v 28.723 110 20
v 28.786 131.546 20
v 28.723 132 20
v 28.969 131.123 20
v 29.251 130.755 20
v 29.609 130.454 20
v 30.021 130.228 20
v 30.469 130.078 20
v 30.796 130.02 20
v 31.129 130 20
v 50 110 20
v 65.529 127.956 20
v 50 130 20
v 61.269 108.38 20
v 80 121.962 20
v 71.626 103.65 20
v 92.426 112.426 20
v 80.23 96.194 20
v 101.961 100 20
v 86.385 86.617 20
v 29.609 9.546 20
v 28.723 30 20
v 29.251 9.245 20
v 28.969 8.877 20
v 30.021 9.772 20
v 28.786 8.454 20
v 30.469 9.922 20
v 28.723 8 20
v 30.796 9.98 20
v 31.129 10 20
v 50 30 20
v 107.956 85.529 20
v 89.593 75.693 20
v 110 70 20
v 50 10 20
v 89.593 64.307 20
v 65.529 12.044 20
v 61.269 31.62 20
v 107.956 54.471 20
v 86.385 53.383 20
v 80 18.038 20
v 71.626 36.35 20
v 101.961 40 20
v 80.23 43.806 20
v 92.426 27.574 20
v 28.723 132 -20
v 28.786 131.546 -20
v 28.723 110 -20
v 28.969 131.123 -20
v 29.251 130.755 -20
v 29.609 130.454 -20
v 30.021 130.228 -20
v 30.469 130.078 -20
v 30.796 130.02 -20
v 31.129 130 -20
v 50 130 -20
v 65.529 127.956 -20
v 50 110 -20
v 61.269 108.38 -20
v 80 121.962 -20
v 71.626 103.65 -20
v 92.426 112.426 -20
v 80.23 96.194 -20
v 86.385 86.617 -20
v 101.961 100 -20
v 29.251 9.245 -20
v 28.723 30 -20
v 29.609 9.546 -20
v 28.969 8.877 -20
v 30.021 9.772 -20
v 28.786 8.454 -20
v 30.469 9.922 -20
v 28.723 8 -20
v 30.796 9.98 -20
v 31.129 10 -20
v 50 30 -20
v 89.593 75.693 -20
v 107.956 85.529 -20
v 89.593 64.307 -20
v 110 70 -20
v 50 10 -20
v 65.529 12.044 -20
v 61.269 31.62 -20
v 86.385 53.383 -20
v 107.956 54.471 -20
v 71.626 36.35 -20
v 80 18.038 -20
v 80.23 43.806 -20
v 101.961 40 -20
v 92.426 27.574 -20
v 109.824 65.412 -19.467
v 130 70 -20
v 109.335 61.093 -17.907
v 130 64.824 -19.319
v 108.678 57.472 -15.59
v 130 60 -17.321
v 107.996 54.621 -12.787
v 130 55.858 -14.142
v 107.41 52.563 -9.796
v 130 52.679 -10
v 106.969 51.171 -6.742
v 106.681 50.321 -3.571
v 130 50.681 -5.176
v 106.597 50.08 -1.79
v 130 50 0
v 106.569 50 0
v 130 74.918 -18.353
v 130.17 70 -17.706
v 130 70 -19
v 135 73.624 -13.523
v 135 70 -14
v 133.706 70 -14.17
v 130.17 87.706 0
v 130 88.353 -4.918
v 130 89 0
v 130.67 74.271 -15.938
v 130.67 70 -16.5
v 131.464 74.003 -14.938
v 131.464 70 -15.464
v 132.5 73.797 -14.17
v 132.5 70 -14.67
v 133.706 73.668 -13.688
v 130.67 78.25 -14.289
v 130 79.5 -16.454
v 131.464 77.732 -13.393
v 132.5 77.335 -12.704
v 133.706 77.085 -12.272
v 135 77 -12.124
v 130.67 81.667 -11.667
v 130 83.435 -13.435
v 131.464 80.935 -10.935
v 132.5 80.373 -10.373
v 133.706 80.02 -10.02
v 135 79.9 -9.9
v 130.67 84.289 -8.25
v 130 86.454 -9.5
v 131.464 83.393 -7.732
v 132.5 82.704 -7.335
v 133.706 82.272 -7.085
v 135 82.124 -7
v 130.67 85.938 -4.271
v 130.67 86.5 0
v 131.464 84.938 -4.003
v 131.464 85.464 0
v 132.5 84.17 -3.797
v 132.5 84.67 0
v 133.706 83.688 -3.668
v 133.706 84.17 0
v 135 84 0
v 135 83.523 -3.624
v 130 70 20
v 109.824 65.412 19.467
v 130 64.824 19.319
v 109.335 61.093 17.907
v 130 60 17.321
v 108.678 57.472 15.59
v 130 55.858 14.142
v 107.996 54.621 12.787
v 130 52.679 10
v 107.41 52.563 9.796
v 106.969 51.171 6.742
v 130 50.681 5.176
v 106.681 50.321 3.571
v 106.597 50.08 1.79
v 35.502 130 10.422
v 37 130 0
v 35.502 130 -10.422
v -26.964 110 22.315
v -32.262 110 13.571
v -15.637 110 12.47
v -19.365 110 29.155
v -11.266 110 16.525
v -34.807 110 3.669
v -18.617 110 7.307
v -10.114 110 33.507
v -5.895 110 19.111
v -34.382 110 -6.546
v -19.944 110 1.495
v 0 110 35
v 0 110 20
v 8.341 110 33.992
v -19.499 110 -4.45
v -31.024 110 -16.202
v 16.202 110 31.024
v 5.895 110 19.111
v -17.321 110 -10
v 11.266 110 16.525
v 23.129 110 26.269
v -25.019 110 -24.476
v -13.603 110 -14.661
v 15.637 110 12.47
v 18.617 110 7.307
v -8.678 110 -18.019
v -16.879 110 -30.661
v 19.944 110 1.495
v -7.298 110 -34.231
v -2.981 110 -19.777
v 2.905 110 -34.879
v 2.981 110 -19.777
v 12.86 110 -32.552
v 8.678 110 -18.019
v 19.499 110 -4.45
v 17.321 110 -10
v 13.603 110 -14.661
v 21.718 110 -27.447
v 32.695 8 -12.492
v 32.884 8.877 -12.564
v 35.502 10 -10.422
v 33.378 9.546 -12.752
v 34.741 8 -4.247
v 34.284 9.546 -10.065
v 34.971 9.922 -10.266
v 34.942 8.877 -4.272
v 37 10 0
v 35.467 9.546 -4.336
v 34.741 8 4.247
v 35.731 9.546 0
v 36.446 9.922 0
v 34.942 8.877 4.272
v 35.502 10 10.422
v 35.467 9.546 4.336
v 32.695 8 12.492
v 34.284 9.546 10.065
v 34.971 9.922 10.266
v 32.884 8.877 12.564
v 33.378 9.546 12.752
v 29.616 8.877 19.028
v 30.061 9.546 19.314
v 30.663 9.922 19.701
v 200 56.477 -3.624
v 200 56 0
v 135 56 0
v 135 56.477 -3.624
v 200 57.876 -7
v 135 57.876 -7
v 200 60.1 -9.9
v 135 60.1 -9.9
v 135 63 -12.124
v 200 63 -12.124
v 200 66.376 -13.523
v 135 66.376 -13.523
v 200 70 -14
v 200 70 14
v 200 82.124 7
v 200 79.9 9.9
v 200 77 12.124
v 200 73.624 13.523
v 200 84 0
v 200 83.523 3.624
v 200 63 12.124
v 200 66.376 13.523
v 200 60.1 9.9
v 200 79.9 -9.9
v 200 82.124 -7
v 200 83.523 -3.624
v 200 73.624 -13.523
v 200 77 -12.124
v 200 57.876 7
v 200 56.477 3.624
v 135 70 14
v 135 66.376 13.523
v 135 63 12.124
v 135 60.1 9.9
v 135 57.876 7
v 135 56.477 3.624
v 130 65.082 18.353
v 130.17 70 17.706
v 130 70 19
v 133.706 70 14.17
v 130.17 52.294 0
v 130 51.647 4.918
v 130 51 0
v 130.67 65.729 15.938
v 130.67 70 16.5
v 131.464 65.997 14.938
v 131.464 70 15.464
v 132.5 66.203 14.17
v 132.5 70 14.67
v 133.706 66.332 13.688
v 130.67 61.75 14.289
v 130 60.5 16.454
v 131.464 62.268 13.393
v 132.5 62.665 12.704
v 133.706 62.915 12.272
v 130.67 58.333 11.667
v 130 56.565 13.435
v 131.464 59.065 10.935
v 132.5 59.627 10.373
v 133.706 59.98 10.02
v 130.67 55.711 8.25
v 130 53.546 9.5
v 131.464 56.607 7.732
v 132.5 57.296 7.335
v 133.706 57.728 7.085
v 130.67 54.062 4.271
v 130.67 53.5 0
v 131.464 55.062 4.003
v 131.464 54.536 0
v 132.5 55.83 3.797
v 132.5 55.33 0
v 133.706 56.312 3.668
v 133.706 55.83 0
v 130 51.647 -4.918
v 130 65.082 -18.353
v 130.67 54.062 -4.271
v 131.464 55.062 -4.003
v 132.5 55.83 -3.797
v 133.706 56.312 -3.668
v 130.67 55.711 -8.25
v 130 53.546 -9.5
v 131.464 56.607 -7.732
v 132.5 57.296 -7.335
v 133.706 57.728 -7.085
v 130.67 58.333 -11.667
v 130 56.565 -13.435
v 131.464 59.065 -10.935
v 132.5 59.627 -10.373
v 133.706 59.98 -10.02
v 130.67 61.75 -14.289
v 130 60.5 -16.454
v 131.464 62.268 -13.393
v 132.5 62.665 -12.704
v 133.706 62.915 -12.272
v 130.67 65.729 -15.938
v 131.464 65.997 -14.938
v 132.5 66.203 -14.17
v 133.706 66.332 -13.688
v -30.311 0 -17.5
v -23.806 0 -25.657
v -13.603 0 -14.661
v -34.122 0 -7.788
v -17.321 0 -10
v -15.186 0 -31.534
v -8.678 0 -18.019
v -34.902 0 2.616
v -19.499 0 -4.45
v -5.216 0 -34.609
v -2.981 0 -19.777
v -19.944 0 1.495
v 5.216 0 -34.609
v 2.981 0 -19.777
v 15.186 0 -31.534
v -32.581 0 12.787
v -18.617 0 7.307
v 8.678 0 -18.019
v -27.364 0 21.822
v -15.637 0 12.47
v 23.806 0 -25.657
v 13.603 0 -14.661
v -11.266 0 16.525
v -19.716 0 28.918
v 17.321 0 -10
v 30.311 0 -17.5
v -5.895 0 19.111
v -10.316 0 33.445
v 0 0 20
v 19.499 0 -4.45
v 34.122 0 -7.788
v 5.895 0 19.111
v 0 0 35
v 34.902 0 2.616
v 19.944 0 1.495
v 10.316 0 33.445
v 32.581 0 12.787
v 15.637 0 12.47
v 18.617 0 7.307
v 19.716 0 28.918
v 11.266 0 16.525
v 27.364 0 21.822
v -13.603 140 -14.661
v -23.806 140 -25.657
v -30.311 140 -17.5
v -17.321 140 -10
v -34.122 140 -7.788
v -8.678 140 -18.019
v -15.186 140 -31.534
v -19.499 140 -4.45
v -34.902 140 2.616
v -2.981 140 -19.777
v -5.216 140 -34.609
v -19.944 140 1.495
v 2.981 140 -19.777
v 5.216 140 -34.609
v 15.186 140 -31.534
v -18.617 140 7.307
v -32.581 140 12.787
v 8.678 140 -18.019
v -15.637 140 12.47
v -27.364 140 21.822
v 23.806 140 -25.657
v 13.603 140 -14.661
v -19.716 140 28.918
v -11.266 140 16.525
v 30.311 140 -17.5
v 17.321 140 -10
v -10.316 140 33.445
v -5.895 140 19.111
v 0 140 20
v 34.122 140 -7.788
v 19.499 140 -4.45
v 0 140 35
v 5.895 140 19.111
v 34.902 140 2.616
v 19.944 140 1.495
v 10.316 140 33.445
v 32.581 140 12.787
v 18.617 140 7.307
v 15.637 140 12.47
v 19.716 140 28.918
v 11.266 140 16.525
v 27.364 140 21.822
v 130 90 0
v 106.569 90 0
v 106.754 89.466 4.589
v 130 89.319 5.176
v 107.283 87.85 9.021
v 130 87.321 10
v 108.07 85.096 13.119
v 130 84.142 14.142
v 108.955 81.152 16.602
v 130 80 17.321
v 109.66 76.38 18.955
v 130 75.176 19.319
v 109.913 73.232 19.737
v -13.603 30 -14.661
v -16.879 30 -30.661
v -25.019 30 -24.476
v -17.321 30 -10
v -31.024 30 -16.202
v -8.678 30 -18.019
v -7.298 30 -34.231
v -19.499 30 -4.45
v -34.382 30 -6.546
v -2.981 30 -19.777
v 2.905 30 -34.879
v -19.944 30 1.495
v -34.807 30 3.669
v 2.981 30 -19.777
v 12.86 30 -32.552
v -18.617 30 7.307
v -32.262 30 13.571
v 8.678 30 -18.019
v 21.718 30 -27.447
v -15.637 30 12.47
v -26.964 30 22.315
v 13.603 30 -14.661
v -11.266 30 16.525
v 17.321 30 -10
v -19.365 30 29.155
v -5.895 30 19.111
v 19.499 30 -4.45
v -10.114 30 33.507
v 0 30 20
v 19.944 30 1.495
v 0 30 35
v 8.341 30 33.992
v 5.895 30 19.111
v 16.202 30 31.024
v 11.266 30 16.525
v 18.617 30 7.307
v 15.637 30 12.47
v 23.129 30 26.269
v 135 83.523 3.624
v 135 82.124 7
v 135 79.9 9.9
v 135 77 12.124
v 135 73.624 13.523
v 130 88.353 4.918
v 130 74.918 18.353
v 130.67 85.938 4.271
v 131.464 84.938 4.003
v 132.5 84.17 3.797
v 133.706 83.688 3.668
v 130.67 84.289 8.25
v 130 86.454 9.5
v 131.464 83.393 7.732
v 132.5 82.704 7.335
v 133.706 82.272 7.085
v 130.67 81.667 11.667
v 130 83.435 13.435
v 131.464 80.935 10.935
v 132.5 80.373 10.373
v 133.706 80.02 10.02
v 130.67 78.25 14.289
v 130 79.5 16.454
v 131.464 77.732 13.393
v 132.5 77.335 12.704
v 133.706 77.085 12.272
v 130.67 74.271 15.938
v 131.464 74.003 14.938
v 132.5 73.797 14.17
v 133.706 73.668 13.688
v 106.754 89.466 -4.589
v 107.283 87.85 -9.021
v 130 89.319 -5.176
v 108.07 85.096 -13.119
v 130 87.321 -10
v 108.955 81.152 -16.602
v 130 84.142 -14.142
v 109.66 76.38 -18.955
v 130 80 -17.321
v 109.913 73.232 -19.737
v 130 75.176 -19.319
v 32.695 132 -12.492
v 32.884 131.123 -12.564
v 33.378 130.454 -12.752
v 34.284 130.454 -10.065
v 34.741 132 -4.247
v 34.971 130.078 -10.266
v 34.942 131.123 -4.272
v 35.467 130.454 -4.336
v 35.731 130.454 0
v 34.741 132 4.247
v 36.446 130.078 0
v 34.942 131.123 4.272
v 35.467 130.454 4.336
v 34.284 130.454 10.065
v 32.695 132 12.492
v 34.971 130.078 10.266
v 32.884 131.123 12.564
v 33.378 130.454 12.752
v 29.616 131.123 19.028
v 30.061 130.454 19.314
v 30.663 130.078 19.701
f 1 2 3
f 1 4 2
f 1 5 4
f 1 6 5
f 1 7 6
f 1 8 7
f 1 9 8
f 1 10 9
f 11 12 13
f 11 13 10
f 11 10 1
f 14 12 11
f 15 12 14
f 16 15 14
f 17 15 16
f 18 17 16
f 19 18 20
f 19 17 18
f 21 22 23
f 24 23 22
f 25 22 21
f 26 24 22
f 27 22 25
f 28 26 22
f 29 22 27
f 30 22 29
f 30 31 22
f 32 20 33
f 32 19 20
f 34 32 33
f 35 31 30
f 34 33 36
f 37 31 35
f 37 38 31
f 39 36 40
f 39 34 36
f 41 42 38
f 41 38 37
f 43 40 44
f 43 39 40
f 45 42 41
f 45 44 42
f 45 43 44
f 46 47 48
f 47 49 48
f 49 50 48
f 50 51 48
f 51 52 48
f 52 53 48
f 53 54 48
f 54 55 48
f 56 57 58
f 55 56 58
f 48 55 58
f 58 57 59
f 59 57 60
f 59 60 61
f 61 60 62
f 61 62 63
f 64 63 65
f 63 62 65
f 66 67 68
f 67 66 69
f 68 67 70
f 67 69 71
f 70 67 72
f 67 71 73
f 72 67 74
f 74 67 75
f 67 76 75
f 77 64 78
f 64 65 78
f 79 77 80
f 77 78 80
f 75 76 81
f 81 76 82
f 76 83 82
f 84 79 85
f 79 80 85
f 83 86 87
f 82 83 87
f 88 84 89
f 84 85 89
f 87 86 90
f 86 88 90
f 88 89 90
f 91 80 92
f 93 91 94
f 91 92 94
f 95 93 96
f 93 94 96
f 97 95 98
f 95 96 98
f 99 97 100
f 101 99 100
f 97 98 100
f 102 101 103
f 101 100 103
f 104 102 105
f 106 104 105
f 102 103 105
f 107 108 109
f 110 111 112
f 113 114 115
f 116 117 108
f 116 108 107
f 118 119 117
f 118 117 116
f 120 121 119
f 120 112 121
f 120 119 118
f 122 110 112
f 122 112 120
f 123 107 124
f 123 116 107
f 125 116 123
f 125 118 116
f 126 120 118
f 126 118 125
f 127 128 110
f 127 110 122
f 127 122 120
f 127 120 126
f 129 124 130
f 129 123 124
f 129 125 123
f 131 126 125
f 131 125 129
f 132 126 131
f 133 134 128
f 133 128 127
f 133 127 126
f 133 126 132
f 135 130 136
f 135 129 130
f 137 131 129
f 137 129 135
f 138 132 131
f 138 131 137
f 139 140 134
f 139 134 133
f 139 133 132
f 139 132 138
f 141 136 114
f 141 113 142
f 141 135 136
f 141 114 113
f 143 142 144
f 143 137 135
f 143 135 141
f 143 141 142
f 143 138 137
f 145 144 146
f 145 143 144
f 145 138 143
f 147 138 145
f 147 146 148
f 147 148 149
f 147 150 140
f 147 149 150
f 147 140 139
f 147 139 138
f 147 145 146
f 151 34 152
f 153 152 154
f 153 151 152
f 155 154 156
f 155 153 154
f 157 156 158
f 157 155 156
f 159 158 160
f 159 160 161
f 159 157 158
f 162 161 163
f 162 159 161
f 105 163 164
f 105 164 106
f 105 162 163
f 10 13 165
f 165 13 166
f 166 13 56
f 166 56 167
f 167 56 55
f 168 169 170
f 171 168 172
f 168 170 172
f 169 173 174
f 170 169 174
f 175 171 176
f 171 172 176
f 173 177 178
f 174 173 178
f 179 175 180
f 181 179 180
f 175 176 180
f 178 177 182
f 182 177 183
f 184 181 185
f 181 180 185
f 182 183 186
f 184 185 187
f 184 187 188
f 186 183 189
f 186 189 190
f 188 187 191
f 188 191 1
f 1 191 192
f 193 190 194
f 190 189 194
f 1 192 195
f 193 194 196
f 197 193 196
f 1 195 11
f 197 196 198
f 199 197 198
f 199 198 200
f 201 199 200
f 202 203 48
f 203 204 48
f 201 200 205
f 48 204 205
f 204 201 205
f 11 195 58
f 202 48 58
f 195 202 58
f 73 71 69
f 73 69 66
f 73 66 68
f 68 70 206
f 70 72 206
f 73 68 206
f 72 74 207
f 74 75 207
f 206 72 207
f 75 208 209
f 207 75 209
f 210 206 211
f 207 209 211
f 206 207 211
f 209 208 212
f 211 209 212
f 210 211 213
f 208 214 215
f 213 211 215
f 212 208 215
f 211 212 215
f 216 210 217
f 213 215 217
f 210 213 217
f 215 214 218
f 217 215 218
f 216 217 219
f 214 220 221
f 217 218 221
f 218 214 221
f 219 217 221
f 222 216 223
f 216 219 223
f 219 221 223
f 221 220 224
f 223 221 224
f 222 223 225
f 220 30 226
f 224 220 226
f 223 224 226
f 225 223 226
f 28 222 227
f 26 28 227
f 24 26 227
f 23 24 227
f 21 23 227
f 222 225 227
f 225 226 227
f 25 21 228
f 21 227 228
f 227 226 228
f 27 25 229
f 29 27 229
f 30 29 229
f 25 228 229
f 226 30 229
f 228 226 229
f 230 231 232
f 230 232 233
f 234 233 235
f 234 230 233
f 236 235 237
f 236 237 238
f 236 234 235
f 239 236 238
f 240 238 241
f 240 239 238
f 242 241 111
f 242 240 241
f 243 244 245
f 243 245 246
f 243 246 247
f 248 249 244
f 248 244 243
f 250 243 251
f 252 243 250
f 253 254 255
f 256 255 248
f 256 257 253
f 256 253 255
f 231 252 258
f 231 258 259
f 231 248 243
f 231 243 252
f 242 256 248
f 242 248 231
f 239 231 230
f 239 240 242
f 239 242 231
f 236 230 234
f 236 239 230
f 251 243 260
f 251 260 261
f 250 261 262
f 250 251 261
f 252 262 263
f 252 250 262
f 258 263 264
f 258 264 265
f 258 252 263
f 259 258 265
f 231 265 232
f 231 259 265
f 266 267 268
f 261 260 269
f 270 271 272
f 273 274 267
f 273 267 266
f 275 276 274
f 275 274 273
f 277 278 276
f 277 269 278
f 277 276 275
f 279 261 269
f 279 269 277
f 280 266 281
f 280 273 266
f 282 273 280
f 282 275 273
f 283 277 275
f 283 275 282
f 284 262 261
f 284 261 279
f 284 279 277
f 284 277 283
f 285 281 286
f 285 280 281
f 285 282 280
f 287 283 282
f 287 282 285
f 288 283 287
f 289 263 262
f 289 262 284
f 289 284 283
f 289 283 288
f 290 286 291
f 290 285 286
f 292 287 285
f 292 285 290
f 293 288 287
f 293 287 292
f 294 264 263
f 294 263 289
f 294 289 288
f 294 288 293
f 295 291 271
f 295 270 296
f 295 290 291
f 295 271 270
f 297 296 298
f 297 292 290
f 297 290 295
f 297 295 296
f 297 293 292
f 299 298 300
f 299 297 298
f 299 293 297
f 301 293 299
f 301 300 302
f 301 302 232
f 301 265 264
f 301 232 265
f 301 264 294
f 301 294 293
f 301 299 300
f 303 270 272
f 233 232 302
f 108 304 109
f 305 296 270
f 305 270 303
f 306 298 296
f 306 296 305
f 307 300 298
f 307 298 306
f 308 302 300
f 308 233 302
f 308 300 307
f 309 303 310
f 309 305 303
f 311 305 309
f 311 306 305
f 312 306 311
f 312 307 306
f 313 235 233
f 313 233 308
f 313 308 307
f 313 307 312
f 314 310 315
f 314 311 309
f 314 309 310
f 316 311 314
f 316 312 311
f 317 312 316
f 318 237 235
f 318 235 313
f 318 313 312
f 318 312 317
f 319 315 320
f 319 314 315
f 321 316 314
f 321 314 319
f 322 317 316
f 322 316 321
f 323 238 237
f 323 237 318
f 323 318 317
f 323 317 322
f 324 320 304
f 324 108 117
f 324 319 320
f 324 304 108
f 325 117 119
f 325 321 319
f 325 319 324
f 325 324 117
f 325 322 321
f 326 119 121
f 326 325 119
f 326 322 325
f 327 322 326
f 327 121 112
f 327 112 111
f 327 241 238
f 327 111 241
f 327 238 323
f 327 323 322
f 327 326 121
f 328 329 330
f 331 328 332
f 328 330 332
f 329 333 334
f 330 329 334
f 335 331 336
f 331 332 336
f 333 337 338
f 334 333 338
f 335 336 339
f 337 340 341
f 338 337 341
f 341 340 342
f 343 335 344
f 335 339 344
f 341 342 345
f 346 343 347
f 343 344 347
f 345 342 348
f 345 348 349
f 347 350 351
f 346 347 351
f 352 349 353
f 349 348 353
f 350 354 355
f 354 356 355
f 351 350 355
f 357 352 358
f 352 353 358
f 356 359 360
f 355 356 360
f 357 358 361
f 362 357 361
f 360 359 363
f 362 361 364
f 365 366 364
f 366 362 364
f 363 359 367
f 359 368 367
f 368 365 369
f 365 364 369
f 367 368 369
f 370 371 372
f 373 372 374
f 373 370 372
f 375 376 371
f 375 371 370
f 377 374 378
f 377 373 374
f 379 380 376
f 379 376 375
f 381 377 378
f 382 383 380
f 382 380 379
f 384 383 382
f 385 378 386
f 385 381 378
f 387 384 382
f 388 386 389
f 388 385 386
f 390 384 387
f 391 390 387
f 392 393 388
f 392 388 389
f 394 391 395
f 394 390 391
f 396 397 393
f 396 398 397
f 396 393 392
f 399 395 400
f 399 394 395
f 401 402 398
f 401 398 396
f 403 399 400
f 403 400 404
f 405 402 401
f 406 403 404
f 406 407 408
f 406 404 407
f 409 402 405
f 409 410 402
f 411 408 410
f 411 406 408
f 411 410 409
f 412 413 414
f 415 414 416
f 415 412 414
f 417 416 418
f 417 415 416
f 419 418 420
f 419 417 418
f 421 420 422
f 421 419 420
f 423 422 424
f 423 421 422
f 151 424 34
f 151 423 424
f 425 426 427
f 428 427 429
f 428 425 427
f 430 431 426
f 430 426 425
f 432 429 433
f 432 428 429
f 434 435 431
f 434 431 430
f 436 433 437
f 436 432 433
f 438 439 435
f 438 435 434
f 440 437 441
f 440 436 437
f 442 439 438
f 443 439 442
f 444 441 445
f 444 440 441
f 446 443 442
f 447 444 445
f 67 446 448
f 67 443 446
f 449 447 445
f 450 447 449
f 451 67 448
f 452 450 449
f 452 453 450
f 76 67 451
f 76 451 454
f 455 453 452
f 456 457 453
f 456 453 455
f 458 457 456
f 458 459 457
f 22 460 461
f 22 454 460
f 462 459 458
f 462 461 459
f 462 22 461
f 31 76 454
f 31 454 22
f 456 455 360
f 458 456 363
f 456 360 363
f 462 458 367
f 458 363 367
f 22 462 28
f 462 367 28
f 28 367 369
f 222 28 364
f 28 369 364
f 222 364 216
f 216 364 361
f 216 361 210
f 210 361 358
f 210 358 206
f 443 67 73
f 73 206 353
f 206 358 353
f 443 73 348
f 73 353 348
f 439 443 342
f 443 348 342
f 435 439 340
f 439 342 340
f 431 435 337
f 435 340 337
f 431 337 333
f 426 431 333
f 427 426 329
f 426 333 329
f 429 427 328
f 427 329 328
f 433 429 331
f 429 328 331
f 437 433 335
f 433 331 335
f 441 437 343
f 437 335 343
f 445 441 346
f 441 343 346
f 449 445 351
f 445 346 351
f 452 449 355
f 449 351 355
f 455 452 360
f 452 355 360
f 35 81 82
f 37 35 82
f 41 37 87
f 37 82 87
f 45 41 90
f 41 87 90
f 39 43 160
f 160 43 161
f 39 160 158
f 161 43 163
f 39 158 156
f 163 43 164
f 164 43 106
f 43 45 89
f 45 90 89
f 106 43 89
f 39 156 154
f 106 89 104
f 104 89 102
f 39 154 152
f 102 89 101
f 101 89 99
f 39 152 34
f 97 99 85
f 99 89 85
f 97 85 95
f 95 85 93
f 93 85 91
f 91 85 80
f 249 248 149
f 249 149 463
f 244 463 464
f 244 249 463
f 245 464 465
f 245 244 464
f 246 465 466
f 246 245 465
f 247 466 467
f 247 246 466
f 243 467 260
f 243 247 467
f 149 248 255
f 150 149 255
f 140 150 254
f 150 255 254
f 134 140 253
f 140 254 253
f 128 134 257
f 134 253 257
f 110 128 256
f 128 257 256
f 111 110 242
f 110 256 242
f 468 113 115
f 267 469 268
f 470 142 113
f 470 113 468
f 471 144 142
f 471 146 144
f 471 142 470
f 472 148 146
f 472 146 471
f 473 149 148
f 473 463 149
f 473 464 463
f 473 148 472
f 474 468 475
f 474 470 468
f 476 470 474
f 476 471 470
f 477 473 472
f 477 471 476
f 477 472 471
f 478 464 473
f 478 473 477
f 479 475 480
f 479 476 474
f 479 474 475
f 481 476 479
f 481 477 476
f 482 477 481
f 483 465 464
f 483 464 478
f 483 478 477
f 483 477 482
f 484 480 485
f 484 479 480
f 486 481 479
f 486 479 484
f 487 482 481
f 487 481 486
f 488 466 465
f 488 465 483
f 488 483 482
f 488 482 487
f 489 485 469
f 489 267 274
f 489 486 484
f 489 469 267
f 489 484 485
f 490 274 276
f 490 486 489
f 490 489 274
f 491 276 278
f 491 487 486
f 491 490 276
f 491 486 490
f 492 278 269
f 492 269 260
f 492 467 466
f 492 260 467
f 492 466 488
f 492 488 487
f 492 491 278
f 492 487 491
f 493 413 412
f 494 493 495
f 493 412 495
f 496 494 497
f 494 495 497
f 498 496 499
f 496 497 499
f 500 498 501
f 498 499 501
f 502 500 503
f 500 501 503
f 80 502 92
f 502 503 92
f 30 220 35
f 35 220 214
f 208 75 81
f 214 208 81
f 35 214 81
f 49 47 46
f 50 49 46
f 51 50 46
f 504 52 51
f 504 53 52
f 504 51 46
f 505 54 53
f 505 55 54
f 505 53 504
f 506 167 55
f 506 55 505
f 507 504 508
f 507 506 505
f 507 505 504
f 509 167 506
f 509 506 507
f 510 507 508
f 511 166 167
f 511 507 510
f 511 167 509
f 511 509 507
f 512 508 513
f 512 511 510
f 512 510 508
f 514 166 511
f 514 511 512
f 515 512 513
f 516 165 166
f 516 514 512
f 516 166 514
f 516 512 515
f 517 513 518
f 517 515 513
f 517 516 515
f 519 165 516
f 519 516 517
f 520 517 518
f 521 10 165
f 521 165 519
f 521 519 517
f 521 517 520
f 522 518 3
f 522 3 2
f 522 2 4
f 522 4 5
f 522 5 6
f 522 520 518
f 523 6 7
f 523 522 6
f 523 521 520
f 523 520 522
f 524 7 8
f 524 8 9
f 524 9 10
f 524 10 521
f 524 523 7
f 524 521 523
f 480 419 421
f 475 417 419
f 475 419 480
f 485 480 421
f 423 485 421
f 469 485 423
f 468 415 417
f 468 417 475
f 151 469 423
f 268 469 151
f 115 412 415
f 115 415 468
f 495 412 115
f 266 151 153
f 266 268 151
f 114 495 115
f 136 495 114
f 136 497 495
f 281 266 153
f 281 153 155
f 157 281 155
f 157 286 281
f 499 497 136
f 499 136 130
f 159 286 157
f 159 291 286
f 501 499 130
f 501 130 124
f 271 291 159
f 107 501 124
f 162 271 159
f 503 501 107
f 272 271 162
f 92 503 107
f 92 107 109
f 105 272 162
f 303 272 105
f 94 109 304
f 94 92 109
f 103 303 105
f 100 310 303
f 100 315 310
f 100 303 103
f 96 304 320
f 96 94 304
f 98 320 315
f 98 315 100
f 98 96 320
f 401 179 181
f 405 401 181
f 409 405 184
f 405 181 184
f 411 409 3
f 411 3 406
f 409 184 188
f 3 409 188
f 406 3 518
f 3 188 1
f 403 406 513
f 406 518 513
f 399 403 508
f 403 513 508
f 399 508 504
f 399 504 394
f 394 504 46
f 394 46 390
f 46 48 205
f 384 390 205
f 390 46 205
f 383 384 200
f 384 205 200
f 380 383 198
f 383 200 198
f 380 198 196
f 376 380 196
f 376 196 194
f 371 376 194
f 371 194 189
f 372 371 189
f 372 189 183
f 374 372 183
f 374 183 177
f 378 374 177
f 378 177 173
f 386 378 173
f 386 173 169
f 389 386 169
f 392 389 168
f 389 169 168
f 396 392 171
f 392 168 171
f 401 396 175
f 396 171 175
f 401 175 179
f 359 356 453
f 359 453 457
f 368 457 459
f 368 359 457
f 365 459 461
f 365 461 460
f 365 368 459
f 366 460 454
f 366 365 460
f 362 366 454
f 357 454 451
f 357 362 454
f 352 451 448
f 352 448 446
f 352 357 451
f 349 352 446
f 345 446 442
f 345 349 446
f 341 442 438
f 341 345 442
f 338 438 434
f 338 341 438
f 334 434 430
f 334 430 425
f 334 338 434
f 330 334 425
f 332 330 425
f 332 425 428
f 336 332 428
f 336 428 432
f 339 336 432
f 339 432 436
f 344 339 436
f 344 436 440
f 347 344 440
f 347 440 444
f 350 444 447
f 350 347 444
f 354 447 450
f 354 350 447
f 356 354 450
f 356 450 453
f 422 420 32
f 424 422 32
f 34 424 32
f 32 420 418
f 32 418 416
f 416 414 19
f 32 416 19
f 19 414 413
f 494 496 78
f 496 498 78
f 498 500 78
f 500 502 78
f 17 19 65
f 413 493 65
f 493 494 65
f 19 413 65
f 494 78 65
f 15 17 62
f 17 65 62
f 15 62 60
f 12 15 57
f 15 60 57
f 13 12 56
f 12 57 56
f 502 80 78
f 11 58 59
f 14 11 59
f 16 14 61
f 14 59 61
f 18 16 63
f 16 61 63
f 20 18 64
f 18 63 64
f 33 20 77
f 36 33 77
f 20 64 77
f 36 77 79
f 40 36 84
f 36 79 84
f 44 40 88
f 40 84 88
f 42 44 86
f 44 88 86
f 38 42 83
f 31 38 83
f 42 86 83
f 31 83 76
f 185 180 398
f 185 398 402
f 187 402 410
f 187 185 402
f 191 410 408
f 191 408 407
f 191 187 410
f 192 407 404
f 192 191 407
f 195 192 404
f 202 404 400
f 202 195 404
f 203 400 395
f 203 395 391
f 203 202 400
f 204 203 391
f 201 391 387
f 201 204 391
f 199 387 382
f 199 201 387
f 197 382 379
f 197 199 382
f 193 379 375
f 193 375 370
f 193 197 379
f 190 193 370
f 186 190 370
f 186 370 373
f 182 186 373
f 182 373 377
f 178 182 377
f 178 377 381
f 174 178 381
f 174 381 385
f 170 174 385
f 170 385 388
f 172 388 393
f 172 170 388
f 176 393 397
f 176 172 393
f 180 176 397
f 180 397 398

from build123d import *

# Parameters (mm, degrees)
SKETCH3_R                = 35
SKETCH3_R_2              = 20
BOSS_EXTRUDE1_DEPTH      = 30
LPATTERN2_COUNT          = 2
LPATTERN2_PITCH          = 110
BOSS_EXTRUDE2_DEPTH      = 20
BOSS_EXTRUDE2_DEPTH_BACK = 20
FILLET1_R                = 2
BOSS_EXTRUDE3_DEPTH      = 20
BOSS_EXTRUDE3_DEPTH_BACK = 20
SKETCH6_W                = 40
SKETCH6_H                = 30
BOSS_EXTRUDE4_DEPTH      = 14
BOSS_EXTRUDE4_DEPTH_BACK = 14
SKETCH6_3_W              = 28
SKETCH6_3_H              = 70
FILLET2_R                = 14
FILLET3_R                = 20
FILLET4_R                = 5


with BuildPart() as part:
    # Sketch3 → Boss-Extrude1 (new body)
    with BuildSketch(Plane(origin=(0, 0, 0), x_dir=(1, 0, 0), z_dir=(0, 1, 0))):
        with Locations(Location((0, 0, 0), (0, 0, 270))):
            Circle(SKETCH3_R)
        with Locations(Location((0, 0, 0), (0, 0, 270))):
            Circle(SKETCH3_R_2, mode=Mode.SUBTRACT)
    extrude(amount=BOSS_EXTRUDE1_DEPTH)


with BuildPart() as lpattern2_1:
    # LPattern2: pattern copy
    add(part.part.moved(Location(Vector(0, 1, 0) * (1 * LPATTERN2_PITCH))))


with BuildPart() as part_1:
    add(part.part)

    add(lpattern2_1.part)  # Boss-Extrude2 merges LPattern2_1
    # Sketch5 → Boss-Extrude2 (add, two sides: drawn at the far end of the back side and taken through both)
    with BuildSketch(Plane(origin=(0, 0, 0), x_dir=(0, -1, 0), z_dir=(0, 0, 1)).offset(-BOSS_EXTRUDE2_DEPTH_BACK)):
        with BuildLine():
            Line((-10, 21.3), (-10, 50))
            ThreePointArc((-10, 50), (-70, 110), (-130, 50))
            Line((-130, 50), (-130, 21.3))
            Line((-130, 21.3), (-110, 21.3))
            Line((-110, 21.3), (-110, 50))
            ThreePointArc((-110, 50), (-70, 90), (-30, 50))
            Line((-30, 50), (-30, 21.3))
            Line((-30, 21.3), (-10, 21.3))
        make_face()
    extrude(amount=BOSS_EXTRUDE2_DEPTH + BOSS_EXTRUDE2_DEPTH_BACK)

    # Fillet1
    fillet1_edges = [part_1.edges().sort_by_distance(p)[0] for p in [
        (35, 10, 0),
        (35, 130, 0),
    ]]
    fillet(fillet1_edges, radius=FILLET1_R)

    # Sketch6 → Boss-Extrude3 (add, two sides: drawn at the far end of the back side and taken through both)
    with BuildSketch(Plane(origin=(0, 0, 0), x_dir=(0, -1, 0), z_dir=(0, 0, 1)).offset(-BOSS_EXTRUDE3_DEPTH_BACK)):
        with Locations((-70, 115)):
            Rectangle(SKETCH6_W, SKETCH6_H)
    extrude(amount=BOSS_EXTRUDE3_DEPTH + BOSS_EXTRUDE3_DEPTH_BACK)

    # Sketch6<3> → Boss-Extrude4 (add, two sides: drawn at the far end of the back side and taken through both)
    with BuildSketch(Plane(origin=(0, 0, 0), x_dir=(0, -1, 0), z_dir=(0, 0, 1)).offset(-BOSS_EXTRUDE4_DEPTH_BACK)):
        with Locations((-70, 165)):
            Rectangle(SKETCH6_3_W, SKETCH6_3_H)
    extrude(amount=BOSS_EXTRUDE4_DEPTH + BOSS_EXTRUDE4_DEPTH_BACK)

    # Fillet2
    fillet2_edges = [part_1.edges().sort_by_distance(p)[0] for p in [
        (165, 56, -14),
        (165, 56, 14),
        (165, 84, 14),
        (165, 84, -14),
    ]]
    fillet(fillet2_edges, radius=FILLET2_R - 0.0001)  # a hair under: the kernel refuses the full size

    # Fillet3
    fillet3_edges = [part_1.edges().sort_by_distance(p)[0] for p in [
        (118.284271247, 50, -20),
        (118.284271247, 50, 20),
        (118.284271247, 90, 20),
        (118.284271247, 90, -20),
    ]]
    fillet(fillet3_edges, radius=FILLET3_R - 0.0001)  # a hair under: the kernel refuses the full size

    # Fillet4
    fillet4_edges = [part_1.edges().sort_by_distance(p)[0] for p in [
        (130, 60.100475774, -9.899524226),
        (130, 60.100475774, 9.899524226),
        (130, 79.899524226, 9.899524226),
        (130, 79.899524226, -9.899524226),
    ]]
    fillet(fillet4_edges, radius=FILLET4_R)


solid = part_1.part
